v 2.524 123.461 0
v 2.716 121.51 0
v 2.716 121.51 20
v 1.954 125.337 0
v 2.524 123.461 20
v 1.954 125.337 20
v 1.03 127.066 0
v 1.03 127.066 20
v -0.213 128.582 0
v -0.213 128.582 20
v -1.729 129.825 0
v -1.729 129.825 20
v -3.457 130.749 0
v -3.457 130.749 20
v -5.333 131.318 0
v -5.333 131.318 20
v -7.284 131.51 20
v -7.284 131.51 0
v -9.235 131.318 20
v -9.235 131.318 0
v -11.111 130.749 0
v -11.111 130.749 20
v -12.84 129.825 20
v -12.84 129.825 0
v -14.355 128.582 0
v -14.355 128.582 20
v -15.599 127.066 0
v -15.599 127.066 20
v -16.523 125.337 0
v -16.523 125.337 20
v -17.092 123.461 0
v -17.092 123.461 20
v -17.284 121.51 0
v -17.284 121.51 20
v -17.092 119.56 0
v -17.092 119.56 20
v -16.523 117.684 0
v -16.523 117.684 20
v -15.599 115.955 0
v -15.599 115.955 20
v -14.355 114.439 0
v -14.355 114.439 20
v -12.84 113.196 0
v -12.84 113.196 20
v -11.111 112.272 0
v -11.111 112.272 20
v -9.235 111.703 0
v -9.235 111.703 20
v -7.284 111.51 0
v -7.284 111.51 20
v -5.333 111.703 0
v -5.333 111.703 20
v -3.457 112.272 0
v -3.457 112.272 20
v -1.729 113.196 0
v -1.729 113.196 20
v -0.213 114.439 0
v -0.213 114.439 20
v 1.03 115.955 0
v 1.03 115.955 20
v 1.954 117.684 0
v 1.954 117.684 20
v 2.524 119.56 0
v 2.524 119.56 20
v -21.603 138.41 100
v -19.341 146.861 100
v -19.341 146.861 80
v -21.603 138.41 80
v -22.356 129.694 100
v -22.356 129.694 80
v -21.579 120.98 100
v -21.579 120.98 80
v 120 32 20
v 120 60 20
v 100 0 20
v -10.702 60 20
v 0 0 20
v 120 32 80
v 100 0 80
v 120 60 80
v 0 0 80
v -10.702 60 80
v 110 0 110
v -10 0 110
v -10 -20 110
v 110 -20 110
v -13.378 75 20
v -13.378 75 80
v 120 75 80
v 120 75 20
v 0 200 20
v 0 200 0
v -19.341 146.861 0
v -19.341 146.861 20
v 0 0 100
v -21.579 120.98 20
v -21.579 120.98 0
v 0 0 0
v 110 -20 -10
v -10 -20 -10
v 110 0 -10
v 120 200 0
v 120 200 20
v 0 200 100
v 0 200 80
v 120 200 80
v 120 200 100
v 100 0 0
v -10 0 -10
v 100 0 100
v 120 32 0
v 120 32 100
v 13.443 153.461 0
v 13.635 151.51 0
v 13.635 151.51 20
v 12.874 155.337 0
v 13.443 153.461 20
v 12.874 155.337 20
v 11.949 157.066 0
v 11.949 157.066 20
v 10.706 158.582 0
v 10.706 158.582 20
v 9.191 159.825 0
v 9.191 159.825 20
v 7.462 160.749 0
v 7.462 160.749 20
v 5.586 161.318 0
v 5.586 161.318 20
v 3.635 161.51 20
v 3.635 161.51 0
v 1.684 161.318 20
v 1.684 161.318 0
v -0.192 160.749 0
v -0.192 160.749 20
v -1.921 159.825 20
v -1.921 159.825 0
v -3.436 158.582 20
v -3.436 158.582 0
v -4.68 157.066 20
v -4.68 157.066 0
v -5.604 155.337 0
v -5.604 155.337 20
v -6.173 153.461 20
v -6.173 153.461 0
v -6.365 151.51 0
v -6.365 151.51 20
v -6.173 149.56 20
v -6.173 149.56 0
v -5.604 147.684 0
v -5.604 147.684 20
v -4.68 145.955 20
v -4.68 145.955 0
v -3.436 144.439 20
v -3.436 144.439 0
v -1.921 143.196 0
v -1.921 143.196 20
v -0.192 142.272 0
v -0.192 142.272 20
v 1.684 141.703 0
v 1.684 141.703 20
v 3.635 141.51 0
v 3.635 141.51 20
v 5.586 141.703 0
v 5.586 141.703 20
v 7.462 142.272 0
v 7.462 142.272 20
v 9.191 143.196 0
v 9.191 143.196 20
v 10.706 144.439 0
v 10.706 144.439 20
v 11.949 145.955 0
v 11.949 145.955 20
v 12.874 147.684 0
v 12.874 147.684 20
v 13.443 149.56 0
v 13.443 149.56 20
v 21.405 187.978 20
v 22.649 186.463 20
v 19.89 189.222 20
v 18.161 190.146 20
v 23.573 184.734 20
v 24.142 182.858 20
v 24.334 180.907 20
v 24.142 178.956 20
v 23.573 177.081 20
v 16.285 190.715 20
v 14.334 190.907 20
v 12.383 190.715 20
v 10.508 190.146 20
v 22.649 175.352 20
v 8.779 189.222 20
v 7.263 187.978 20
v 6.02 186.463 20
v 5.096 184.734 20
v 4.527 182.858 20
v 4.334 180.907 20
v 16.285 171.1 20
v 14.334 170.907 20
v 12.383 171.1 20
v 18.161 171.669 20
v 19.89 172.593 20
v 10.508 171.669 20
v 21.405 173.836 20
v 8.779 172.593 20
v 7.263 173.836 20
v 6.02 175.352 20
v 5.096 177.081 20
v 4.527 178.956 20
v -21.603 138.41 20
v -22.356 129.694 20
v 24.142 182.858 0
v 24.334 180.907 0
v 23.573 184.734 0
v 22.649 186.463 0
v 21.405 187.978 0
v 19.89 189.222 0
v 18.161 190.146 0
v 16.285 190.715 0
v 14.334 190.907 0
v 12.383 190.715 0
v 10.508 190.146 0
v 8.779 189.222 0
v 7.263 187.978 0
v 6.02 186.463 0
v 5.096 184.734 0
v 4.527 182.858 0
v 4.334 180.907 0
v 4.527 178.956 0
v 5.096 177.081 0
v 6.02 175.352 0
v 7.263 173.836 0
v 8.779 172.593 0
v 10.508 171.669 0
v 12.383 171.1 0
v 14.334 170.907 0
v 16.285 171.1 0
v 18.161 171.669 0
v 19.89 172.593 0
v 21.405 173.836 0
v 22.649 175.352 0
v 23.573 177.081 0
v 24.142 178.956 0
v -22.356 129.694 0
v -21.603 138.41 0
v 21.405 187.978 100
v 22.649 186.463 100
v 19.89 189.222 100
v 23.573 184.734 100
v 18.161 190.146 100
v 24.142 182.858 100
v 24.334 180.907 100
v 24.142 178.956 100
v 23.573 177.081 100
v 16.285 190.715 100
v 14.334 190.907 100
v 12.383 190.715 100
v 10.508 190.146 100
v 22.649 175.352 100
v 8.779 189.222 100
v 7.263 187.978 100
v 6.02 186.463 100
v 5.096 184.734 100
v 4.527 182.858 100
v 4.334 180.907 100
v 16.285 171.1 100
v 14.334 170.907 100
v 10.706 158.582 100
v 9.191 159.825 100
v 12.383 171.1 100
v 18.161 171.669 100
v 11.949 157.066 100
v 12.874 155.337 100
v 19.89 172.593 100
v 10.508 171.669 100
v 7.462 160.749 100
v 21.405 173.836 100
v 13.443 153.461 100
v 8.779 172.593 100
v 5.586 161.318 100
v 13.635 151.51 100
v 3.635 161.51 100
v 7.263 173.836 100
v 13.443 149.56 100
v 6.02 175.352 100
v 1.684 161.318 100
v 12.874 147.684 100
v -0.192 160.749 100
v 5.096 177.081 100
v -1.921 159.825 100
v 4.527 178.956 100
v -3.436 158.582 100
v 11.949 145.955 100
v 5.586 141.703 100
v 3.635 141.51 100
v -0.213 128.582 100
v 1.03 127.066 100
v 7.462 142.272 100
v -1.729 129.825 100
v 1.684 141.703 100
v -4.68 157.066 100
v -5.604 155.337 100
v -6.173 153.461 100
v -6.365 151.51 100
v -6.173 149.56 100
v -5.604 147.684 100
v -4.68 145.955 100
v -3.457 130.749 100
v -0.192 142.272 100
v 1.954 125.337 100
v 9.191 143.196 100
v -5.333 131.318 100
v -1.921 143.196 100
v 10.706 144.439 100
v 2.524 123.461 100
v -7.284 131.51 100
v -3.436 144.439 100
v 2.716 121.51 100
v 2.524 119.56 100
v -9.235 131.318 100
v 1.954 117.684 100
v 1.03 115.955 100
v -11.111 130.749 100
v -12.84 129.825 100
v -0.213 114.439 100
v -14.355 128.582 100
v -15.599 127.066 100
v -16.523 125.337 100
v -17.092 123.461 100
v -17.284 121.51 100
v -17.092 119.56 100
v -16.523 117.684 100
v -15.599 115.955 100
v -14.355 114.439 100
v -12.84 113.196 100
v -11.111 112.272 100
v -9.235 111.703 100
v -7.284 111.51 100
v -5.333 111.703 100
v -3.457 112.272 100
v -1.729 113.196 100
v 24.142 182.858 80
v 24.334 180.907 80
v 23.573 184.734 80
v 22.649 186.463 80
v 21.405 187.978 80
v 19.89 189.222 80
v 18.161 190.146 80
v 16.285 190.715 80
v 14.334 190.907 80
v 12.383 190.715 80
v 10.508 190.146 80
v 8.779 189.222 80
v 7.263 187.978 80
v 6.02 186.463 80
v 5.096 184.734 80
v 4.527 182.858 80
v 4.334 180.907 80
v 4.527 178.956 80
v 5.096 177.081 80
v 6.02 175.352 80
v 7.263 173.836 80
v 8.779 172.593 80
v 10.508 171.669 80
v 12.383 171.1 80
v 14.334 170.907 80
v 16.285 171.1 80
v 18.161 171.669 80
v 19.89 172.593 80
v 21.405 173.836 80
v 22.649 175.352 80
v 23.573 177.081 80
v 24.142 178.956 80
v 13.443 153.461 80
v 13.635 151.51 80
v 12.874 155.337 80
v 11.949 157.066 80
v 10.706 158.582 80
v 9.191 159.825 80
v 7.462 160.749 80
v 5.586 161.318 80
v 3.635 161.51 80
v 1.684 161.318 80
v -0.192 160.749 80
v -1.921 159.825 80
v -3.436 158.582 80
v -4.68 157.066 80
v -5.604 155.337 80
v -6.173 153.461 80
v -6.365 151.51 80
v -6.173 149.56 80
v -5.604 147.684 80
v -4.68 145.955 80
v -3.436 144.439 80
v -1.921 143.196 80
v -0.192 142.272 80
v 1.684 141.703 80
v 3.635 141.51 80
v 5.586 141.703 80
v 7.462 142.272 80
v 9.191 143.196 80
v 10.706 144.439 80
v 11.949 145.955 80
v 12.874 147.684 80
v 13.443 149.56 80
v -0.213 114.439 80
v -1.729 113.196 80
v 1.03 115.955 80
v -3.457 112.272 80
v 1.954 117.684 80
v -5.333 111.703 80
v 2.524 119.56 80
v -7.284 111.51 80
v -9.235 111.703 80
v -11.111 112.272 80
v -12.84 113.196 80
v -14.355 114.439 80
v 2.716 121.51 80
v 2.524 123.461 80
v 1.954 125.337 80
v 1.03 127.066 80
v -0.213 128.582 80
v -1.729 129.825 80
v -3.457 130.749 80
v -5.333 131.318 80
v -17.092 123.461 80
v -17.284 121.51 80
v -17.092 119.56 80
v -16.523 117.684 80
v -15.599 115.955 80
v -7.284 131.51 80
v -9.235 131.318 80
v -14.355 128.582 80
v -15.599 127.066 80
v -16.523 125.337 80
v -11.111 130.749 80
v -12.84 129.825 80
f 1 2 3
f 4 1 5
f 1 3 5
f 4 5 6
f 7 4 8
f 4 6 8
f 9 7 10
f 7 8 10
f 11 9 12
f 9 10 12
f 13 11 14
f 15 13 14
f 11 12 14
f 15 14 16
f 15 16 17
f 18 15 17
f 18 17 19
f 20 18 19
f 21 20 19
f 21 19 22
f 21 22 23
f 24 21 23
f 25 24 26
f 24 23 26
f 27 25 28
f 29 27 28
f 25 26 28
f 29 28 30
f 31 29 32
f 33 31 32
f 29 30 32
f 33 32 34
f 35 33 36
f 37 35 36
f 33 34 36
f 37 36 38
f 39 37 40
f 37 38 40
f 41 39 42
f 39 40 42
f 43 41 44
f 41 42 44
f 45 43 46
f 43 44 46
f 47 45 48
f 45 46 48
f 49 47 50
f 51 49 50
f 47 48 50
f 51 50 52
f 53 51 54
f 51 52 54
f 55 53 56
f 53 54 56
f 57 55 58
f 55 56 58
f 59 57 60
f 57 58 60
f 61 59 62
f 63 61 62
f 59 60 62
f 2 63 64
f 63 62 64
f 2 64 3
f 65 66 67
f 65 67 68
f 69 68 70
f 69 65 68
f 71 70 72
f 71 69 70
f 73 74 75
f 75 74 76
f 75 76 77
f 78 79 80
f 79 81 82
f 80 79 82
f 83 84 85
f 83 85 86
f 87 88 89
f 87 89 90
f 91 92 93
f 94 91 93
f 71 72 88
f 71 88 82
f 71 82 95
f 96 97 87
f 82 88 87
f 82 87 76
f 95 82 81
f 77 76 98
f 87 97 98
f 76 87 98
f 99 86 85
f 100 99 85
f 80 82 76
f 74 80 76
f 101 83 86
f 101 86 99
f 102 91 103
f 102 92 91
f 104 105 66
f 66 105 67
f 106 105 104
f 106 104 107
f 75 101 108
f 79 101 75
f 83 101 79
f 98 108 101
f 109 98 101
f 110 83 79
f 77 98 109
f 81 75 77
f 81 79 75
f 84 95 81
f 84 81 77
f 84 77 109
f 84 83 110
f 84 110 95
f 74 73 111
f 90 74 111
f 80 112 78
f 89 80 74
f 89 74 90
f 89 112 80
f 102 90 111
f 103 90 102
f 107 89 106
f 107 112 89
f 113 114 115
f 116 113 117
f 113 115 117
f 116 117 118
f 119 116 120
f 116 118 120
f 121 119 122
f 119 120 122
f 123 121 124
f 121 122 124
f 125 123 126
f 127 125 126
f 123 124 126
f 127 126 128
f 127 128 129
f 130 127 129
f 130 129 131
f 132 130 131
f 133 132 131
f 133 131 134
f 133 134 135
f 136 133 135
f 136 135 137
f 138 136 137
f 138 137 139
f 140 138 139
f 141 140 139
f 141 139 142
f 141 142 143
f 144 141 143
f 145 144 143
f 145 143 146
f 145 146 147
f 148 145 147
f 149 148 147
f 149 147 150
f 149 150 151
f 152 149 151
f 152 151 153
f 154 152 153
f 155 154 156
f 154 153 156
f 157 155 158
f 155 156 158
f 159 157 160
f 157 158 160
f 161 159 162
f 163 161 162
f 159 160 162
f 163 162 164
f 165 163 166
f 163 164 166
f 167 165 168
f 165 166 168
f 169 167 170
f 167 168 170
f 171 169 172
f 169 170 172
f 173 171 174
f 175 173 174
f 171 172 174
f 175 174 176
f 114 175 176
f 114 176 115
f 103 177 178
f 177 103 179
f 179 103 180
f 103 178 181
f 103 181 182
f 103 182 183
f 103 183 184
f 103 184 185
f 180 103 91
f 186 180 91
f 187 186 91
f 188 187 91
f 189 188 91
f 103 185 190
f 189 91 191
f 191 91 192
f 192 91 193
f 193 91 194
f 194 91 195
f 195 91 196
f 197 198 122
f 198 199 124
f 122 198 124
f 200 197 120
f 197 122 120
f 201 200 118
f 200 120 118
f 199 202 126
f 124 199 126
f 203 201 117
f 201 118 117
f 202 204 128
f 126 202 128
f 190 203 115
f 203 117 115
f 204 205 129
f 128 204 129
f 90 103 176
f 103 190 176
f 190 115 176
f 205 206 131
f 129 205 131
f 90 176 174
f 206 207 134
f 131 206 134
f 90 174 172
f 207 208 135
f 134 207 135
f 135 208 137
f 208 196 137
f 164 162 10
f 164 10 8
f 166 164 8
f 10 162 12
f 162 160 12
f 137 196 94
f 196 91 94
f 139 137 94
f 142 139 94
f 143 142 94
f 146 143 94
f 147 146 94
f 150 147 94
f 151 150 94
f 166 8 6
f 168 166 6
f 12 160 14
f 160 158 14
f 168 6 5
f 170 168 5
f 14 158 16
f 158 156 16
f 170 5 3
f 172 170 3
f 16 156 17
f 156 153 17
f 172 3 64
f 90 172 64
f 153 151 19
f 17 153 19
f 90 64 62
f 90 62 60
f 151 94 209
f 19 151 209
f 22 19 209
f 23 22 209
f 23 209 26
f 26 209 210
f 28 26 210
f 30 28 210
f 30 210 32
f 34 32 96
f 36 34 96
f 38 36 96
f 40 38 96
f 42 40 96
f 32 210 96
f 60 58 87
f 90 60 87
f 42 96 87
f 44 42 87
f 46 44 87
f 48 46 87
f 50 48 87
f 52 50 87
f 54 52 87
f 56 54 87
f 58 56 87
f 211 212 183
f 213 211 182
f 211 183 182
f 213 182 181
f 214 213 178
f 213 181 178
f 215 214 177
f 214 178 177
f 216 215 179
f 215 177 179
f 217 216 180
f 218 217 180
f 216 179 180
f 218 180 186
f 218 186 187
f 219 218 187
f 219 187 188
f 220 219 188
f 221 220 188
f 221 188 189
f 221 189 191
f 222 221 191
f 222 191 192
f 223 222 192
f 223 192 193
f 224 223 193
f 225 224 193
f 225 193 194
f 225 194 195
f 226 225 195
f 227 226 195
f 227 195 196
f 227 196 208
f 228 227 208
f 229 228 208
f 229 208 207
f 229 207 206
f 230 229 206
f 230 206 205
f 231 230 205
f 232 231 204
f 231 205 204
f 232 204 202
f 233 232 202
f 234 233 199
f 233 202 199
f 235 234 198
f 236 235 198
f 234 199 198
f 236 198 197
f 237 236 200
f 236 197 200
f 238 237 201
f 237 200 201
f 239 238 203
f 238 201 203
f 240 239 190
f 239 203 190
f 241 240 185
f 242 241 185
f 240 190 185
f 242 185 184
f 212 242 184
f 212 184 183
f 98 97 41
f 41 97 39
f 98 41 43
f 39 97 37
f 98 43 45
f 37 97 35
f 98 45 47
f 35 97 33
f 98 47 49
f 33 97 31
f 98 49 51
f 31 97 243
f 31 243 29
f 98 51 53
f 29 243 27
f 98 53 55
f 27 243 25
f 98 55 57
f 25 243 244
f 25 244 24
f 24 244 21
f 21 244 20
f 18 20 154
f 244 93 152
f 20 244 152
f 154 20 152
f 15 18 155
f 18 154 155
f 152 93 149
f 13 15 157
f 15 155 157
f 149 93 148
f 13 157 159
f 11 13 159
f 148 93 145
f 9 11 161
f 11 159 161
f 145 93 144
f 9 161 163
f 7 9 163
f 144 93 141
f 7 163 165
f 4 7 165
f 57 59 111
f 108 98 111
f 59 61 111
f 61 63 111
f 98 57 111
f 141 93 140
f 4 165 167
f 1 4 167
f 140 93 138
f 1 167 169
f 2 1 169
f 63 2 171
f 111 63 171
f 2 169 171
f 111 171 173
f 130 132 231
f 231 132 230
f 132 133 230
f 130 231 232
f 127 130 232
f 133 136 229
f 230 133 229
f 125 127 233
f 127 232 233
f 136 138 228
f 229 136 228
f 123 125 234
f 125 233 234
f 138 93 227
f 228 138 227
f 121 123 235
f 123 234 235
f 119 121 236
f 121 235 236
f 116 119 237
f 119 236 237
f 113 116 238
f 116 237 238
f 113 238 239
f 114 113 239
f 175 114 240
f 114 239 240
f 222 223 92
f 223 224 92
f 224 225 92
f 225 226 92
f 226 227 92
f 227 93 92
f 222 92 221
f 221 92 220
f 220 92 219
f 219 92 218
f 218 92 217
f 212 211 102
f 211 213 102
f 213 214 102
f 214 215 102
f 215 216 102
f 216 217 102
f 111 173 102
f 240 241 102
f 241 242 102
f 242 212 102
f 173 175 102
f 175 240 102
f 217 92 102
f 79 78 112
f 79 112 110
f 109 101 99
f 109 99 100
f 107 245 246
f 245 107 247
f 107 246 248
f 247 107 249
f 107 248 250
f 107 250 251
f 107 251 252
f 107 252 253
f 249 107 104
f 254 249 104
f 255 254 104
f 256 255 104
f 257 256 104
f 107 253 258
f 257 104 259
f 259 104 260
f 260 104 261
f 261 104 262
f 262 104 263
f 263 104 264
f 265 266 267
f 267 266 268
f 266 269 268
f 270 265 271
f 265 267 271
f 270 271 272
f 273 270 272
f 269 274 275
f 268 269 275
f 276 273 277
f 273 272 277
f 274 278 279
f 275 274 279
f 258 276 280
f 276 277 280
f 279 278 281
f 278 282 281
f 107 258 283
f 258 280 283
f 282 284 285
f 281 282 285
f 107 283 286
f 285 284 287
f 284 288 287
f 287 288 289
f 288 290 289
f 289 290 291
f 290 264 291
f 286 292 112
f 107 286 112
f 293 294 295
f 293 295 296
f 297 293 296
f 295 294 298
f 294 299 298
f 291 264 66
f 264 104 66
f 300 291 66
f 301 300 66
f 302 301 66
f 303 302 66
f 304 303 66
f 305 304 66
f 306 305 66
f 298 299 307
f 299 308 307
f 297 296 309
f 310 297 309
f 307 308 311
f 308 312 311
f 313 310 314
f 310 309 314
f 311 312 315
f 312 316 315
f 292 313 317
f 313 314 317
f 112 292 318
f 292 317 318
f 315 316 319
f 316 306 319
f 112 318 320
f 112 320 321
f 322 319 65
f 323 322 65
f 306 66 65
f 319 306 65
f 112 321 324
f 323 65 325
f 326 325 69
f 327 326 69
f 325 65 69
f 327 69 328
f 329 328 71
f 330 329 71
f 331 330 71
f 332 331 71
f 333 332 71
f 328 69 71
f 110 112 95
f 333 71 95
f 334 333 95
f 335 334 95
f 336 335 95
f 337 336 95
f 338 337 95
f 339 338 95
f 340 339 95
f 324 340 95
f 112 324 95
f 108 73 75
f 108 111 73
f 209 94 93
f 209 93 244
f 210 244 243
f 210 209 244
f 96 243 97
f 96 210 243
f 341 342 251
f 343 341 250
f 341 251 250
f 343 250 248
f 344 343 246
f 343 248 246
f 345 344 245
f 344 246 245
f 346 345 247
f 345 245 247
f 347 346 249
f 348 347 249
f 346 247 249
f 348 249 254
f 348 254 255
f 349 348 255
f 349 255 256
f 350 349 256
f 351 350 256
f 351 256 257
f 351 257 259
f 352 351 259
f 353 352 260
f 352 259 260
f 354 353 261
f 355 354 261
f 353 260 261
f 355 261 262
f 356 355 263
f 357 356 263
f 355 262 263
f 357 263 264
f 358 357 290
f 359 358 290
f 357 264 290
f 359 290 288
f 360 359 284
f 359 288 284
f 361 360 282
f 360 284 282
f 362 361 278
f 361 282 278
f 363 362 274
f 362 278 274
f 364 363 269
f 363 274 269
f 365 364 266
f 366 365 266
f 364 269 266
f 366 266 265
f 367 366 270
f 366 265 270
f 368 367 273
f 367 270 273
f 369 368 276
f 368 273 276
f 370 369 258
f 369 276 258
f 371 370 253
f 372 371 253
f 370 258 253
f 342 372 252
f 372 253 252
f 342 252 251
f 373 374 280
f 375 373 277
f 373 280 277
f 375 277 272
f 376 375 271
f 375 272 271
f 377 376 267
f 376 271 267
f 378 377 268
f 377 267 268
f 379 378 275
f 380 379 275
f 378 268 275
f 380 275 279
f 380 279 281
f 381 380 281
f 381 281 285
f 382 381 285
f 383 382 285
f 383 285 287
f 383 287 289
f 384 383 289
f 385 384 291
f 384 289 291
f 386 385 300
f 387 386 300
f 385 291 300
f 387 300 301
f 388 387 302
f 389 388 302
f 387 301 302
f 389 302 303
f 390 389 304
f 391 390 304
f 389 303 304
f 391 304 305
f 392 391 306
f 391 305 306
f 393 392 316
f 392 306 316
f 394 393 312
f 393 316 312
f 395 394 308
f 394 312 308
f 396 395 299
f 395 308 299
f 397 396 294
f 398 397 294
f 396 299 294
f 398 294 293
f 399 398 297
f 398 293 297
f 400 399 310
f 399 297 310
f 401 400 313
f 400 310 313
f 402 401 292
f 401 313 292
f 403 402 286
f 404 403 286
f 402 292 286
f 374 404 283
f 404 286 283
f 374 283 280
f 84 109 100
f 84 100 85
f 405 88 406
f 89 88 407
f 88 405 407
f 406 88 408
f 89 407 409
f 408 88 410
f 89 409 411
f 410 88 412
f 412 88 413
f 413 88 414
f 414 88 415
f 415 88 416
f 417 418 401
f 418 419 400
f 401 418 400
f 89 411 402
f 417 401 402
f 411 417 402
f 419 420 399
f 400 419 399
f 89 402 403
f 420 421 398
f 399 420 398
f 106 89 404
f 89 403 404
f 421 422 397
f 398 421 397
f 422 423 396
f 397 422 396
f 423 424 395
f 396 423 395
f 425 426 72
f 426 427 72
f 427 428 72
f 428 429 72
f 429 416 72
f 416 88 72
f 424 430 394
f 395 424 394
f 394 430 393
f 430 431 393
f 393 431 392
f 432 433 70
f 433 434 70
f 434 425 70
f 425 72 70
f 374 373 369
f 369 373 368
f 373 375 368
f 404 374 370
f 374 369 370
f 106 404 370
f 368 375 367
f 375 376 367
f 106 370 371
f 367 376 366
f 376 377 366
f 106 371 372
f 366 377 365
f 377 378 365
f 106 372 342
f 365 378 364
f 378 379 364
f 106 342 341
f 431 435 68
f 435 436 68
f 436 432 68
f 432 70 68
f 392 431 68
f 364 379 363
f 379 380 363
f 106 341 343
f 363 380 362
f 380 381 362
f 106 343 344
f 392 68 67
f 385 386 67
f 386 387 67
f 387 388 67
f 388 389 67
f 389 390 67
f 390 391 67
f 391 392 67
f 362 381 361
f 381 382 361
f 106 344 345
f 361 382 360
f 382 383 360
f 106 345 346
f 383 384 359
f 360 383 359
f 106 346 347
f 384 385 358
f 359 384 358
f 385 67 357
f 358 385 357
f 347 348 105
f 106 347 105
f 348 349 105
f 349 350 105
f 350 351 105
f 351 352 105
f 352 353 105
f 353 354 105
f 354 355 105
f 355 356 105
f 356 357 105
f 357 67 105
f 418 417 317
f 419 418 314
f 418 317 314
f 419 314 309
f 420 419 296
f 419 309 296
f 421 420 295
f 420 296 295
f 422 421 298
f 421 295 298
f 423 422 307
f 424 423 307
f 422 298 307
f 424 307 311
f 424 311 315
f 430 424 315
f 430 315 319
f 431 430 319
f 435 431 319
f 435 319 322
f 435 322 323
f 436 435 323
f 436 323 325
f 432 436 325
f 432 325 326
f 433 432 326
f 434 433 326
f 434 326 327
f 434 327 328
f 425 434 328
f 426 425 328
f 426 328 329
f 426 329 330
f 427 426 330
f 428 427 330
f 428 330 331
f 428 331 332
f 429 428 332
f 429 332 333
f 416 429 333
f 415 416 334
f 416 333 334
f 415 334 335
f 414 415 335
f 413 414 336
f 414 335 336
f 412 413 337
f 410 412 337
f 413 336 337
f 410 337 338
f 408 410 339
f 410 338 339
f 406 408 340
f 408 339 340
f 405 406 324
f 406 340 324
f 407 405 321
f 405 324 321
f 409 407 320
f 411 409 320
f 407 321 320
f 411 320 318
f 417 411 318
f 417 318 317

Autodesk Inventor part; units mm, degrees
ref_plane "YZ Plane" through (0, 0, 0) normal (1, 0, 0) x (0, 1, 0)
ref_plane "XZ Plane" through (0, 0, 0) normal (0, 1, 0) x (-1, 0, 0)
ref_plane "XY Plane" through (0, 0, 0) normal (0, 0, 1) x (1, 0, 0)
sketch "Sketch1" plane through (0, 0, 0) normal (0, 0, 1) x (1, 0, 0)
  line L0 (0, 0) -> (100, 0)
  line L1 (0, 200) -> (150, 200)
  line L2 (150, 200) -> (150, 80)
  line L3 (150, 80) -> (100, 0)
  line L4 (0, 200) -> (-23.9414, 134.2215)
  line L5 (0, 200) -> (70, 200) construction
  line L6 (-23.9414, 134.2215) -> (0, 0)
extrude "Extrusion1" add sketch "Sketch1" along normal blind 120
fillet "Fillet1" radius 50 1 edges at (-23.9414, 134.2215, 60)
sketch "Sketch3" plane through (0, 0, 120) normal (0, 0, 1) x (1, 0, 0)
  line L0 (0, 200) -> (-19.341, 146.861) projected
  circle A0 centre (14.3344, 180.9074) radius 10
  line L1 (14.3344, 180.9074) -> (10.9142, 171.5105)
  line L2 (14.3344, 180.9074) -> (133.919, 180.9074) construction
  circle A1 centre (3.6348, 151.5105) radius 10
  circle A2 centre (-7.2843, 121.5105) radius 10
  dimension "d9" = 20
  dimension "d10" = 20
  dimension "d12" = 20
  dimension "d13" = 20
  dimension "d14" = 30
  dimension "d15" = 20
extrude "Extrusion2" cut sketch "Sketch3" against normal blind 120
sketch "Sketch4" plane through (0, 0, 0) normal (1, 0, 0) x (0, 1, 0)
  line L0 (0, 0) -> (200, 0)
  line L1 (200, 100) -> (0, 100)
  line L2 (200, 20) -> (0, 80) construction
  line L3 (0, 20) -> (200, 80) construction
  line L4 (200, 0) -> (200, 20)
  line L5 (200, 80) -> (200, 100)
  line L6 (0, 100) -> (0, 80)
  line L7 (0, 20) -> (0, 0)
  line L8 (60, 50) -> (60, 20)
  line L9 (60, 50) -> (60, 80)
  line L10 (75, 80) -> (75, 20)
  line L11 (200, 20) -> (75, 20)
  line L12 (60, 20) -> (0, 20)
  line L13 (0, 80) -> (60, 80)
  line L14 (75, 80) -> (200, 80)
  point P0 (100, 50)
extrude "Extrusion3" cut sketch "Sketch4" along normal mid plane 240 keep common part
sketch "Sketch5" plane through (0, 0, 0) normal (0, 1, 0) x (-1, 0, 0)
  line L0 (10, 110) -> (-110, 110)
  line L1 (-110, 110) -> (-110, -10)
  line L2 (-110, -10) -> (10, -10)
  line L3 (10, -10) -> (10, 110)
  line L4 (10, 110) -> (-110, -10) construction
  line L5 (-110, 110) -> (10, -10) construction
  point P0 (0, 0)
  dimension "d28" = 120
  dimension "d29" = 120
extrude "Extrusion4" add sketch "Sketch5" against normal blind 20
properties part number "BADAN 3"
